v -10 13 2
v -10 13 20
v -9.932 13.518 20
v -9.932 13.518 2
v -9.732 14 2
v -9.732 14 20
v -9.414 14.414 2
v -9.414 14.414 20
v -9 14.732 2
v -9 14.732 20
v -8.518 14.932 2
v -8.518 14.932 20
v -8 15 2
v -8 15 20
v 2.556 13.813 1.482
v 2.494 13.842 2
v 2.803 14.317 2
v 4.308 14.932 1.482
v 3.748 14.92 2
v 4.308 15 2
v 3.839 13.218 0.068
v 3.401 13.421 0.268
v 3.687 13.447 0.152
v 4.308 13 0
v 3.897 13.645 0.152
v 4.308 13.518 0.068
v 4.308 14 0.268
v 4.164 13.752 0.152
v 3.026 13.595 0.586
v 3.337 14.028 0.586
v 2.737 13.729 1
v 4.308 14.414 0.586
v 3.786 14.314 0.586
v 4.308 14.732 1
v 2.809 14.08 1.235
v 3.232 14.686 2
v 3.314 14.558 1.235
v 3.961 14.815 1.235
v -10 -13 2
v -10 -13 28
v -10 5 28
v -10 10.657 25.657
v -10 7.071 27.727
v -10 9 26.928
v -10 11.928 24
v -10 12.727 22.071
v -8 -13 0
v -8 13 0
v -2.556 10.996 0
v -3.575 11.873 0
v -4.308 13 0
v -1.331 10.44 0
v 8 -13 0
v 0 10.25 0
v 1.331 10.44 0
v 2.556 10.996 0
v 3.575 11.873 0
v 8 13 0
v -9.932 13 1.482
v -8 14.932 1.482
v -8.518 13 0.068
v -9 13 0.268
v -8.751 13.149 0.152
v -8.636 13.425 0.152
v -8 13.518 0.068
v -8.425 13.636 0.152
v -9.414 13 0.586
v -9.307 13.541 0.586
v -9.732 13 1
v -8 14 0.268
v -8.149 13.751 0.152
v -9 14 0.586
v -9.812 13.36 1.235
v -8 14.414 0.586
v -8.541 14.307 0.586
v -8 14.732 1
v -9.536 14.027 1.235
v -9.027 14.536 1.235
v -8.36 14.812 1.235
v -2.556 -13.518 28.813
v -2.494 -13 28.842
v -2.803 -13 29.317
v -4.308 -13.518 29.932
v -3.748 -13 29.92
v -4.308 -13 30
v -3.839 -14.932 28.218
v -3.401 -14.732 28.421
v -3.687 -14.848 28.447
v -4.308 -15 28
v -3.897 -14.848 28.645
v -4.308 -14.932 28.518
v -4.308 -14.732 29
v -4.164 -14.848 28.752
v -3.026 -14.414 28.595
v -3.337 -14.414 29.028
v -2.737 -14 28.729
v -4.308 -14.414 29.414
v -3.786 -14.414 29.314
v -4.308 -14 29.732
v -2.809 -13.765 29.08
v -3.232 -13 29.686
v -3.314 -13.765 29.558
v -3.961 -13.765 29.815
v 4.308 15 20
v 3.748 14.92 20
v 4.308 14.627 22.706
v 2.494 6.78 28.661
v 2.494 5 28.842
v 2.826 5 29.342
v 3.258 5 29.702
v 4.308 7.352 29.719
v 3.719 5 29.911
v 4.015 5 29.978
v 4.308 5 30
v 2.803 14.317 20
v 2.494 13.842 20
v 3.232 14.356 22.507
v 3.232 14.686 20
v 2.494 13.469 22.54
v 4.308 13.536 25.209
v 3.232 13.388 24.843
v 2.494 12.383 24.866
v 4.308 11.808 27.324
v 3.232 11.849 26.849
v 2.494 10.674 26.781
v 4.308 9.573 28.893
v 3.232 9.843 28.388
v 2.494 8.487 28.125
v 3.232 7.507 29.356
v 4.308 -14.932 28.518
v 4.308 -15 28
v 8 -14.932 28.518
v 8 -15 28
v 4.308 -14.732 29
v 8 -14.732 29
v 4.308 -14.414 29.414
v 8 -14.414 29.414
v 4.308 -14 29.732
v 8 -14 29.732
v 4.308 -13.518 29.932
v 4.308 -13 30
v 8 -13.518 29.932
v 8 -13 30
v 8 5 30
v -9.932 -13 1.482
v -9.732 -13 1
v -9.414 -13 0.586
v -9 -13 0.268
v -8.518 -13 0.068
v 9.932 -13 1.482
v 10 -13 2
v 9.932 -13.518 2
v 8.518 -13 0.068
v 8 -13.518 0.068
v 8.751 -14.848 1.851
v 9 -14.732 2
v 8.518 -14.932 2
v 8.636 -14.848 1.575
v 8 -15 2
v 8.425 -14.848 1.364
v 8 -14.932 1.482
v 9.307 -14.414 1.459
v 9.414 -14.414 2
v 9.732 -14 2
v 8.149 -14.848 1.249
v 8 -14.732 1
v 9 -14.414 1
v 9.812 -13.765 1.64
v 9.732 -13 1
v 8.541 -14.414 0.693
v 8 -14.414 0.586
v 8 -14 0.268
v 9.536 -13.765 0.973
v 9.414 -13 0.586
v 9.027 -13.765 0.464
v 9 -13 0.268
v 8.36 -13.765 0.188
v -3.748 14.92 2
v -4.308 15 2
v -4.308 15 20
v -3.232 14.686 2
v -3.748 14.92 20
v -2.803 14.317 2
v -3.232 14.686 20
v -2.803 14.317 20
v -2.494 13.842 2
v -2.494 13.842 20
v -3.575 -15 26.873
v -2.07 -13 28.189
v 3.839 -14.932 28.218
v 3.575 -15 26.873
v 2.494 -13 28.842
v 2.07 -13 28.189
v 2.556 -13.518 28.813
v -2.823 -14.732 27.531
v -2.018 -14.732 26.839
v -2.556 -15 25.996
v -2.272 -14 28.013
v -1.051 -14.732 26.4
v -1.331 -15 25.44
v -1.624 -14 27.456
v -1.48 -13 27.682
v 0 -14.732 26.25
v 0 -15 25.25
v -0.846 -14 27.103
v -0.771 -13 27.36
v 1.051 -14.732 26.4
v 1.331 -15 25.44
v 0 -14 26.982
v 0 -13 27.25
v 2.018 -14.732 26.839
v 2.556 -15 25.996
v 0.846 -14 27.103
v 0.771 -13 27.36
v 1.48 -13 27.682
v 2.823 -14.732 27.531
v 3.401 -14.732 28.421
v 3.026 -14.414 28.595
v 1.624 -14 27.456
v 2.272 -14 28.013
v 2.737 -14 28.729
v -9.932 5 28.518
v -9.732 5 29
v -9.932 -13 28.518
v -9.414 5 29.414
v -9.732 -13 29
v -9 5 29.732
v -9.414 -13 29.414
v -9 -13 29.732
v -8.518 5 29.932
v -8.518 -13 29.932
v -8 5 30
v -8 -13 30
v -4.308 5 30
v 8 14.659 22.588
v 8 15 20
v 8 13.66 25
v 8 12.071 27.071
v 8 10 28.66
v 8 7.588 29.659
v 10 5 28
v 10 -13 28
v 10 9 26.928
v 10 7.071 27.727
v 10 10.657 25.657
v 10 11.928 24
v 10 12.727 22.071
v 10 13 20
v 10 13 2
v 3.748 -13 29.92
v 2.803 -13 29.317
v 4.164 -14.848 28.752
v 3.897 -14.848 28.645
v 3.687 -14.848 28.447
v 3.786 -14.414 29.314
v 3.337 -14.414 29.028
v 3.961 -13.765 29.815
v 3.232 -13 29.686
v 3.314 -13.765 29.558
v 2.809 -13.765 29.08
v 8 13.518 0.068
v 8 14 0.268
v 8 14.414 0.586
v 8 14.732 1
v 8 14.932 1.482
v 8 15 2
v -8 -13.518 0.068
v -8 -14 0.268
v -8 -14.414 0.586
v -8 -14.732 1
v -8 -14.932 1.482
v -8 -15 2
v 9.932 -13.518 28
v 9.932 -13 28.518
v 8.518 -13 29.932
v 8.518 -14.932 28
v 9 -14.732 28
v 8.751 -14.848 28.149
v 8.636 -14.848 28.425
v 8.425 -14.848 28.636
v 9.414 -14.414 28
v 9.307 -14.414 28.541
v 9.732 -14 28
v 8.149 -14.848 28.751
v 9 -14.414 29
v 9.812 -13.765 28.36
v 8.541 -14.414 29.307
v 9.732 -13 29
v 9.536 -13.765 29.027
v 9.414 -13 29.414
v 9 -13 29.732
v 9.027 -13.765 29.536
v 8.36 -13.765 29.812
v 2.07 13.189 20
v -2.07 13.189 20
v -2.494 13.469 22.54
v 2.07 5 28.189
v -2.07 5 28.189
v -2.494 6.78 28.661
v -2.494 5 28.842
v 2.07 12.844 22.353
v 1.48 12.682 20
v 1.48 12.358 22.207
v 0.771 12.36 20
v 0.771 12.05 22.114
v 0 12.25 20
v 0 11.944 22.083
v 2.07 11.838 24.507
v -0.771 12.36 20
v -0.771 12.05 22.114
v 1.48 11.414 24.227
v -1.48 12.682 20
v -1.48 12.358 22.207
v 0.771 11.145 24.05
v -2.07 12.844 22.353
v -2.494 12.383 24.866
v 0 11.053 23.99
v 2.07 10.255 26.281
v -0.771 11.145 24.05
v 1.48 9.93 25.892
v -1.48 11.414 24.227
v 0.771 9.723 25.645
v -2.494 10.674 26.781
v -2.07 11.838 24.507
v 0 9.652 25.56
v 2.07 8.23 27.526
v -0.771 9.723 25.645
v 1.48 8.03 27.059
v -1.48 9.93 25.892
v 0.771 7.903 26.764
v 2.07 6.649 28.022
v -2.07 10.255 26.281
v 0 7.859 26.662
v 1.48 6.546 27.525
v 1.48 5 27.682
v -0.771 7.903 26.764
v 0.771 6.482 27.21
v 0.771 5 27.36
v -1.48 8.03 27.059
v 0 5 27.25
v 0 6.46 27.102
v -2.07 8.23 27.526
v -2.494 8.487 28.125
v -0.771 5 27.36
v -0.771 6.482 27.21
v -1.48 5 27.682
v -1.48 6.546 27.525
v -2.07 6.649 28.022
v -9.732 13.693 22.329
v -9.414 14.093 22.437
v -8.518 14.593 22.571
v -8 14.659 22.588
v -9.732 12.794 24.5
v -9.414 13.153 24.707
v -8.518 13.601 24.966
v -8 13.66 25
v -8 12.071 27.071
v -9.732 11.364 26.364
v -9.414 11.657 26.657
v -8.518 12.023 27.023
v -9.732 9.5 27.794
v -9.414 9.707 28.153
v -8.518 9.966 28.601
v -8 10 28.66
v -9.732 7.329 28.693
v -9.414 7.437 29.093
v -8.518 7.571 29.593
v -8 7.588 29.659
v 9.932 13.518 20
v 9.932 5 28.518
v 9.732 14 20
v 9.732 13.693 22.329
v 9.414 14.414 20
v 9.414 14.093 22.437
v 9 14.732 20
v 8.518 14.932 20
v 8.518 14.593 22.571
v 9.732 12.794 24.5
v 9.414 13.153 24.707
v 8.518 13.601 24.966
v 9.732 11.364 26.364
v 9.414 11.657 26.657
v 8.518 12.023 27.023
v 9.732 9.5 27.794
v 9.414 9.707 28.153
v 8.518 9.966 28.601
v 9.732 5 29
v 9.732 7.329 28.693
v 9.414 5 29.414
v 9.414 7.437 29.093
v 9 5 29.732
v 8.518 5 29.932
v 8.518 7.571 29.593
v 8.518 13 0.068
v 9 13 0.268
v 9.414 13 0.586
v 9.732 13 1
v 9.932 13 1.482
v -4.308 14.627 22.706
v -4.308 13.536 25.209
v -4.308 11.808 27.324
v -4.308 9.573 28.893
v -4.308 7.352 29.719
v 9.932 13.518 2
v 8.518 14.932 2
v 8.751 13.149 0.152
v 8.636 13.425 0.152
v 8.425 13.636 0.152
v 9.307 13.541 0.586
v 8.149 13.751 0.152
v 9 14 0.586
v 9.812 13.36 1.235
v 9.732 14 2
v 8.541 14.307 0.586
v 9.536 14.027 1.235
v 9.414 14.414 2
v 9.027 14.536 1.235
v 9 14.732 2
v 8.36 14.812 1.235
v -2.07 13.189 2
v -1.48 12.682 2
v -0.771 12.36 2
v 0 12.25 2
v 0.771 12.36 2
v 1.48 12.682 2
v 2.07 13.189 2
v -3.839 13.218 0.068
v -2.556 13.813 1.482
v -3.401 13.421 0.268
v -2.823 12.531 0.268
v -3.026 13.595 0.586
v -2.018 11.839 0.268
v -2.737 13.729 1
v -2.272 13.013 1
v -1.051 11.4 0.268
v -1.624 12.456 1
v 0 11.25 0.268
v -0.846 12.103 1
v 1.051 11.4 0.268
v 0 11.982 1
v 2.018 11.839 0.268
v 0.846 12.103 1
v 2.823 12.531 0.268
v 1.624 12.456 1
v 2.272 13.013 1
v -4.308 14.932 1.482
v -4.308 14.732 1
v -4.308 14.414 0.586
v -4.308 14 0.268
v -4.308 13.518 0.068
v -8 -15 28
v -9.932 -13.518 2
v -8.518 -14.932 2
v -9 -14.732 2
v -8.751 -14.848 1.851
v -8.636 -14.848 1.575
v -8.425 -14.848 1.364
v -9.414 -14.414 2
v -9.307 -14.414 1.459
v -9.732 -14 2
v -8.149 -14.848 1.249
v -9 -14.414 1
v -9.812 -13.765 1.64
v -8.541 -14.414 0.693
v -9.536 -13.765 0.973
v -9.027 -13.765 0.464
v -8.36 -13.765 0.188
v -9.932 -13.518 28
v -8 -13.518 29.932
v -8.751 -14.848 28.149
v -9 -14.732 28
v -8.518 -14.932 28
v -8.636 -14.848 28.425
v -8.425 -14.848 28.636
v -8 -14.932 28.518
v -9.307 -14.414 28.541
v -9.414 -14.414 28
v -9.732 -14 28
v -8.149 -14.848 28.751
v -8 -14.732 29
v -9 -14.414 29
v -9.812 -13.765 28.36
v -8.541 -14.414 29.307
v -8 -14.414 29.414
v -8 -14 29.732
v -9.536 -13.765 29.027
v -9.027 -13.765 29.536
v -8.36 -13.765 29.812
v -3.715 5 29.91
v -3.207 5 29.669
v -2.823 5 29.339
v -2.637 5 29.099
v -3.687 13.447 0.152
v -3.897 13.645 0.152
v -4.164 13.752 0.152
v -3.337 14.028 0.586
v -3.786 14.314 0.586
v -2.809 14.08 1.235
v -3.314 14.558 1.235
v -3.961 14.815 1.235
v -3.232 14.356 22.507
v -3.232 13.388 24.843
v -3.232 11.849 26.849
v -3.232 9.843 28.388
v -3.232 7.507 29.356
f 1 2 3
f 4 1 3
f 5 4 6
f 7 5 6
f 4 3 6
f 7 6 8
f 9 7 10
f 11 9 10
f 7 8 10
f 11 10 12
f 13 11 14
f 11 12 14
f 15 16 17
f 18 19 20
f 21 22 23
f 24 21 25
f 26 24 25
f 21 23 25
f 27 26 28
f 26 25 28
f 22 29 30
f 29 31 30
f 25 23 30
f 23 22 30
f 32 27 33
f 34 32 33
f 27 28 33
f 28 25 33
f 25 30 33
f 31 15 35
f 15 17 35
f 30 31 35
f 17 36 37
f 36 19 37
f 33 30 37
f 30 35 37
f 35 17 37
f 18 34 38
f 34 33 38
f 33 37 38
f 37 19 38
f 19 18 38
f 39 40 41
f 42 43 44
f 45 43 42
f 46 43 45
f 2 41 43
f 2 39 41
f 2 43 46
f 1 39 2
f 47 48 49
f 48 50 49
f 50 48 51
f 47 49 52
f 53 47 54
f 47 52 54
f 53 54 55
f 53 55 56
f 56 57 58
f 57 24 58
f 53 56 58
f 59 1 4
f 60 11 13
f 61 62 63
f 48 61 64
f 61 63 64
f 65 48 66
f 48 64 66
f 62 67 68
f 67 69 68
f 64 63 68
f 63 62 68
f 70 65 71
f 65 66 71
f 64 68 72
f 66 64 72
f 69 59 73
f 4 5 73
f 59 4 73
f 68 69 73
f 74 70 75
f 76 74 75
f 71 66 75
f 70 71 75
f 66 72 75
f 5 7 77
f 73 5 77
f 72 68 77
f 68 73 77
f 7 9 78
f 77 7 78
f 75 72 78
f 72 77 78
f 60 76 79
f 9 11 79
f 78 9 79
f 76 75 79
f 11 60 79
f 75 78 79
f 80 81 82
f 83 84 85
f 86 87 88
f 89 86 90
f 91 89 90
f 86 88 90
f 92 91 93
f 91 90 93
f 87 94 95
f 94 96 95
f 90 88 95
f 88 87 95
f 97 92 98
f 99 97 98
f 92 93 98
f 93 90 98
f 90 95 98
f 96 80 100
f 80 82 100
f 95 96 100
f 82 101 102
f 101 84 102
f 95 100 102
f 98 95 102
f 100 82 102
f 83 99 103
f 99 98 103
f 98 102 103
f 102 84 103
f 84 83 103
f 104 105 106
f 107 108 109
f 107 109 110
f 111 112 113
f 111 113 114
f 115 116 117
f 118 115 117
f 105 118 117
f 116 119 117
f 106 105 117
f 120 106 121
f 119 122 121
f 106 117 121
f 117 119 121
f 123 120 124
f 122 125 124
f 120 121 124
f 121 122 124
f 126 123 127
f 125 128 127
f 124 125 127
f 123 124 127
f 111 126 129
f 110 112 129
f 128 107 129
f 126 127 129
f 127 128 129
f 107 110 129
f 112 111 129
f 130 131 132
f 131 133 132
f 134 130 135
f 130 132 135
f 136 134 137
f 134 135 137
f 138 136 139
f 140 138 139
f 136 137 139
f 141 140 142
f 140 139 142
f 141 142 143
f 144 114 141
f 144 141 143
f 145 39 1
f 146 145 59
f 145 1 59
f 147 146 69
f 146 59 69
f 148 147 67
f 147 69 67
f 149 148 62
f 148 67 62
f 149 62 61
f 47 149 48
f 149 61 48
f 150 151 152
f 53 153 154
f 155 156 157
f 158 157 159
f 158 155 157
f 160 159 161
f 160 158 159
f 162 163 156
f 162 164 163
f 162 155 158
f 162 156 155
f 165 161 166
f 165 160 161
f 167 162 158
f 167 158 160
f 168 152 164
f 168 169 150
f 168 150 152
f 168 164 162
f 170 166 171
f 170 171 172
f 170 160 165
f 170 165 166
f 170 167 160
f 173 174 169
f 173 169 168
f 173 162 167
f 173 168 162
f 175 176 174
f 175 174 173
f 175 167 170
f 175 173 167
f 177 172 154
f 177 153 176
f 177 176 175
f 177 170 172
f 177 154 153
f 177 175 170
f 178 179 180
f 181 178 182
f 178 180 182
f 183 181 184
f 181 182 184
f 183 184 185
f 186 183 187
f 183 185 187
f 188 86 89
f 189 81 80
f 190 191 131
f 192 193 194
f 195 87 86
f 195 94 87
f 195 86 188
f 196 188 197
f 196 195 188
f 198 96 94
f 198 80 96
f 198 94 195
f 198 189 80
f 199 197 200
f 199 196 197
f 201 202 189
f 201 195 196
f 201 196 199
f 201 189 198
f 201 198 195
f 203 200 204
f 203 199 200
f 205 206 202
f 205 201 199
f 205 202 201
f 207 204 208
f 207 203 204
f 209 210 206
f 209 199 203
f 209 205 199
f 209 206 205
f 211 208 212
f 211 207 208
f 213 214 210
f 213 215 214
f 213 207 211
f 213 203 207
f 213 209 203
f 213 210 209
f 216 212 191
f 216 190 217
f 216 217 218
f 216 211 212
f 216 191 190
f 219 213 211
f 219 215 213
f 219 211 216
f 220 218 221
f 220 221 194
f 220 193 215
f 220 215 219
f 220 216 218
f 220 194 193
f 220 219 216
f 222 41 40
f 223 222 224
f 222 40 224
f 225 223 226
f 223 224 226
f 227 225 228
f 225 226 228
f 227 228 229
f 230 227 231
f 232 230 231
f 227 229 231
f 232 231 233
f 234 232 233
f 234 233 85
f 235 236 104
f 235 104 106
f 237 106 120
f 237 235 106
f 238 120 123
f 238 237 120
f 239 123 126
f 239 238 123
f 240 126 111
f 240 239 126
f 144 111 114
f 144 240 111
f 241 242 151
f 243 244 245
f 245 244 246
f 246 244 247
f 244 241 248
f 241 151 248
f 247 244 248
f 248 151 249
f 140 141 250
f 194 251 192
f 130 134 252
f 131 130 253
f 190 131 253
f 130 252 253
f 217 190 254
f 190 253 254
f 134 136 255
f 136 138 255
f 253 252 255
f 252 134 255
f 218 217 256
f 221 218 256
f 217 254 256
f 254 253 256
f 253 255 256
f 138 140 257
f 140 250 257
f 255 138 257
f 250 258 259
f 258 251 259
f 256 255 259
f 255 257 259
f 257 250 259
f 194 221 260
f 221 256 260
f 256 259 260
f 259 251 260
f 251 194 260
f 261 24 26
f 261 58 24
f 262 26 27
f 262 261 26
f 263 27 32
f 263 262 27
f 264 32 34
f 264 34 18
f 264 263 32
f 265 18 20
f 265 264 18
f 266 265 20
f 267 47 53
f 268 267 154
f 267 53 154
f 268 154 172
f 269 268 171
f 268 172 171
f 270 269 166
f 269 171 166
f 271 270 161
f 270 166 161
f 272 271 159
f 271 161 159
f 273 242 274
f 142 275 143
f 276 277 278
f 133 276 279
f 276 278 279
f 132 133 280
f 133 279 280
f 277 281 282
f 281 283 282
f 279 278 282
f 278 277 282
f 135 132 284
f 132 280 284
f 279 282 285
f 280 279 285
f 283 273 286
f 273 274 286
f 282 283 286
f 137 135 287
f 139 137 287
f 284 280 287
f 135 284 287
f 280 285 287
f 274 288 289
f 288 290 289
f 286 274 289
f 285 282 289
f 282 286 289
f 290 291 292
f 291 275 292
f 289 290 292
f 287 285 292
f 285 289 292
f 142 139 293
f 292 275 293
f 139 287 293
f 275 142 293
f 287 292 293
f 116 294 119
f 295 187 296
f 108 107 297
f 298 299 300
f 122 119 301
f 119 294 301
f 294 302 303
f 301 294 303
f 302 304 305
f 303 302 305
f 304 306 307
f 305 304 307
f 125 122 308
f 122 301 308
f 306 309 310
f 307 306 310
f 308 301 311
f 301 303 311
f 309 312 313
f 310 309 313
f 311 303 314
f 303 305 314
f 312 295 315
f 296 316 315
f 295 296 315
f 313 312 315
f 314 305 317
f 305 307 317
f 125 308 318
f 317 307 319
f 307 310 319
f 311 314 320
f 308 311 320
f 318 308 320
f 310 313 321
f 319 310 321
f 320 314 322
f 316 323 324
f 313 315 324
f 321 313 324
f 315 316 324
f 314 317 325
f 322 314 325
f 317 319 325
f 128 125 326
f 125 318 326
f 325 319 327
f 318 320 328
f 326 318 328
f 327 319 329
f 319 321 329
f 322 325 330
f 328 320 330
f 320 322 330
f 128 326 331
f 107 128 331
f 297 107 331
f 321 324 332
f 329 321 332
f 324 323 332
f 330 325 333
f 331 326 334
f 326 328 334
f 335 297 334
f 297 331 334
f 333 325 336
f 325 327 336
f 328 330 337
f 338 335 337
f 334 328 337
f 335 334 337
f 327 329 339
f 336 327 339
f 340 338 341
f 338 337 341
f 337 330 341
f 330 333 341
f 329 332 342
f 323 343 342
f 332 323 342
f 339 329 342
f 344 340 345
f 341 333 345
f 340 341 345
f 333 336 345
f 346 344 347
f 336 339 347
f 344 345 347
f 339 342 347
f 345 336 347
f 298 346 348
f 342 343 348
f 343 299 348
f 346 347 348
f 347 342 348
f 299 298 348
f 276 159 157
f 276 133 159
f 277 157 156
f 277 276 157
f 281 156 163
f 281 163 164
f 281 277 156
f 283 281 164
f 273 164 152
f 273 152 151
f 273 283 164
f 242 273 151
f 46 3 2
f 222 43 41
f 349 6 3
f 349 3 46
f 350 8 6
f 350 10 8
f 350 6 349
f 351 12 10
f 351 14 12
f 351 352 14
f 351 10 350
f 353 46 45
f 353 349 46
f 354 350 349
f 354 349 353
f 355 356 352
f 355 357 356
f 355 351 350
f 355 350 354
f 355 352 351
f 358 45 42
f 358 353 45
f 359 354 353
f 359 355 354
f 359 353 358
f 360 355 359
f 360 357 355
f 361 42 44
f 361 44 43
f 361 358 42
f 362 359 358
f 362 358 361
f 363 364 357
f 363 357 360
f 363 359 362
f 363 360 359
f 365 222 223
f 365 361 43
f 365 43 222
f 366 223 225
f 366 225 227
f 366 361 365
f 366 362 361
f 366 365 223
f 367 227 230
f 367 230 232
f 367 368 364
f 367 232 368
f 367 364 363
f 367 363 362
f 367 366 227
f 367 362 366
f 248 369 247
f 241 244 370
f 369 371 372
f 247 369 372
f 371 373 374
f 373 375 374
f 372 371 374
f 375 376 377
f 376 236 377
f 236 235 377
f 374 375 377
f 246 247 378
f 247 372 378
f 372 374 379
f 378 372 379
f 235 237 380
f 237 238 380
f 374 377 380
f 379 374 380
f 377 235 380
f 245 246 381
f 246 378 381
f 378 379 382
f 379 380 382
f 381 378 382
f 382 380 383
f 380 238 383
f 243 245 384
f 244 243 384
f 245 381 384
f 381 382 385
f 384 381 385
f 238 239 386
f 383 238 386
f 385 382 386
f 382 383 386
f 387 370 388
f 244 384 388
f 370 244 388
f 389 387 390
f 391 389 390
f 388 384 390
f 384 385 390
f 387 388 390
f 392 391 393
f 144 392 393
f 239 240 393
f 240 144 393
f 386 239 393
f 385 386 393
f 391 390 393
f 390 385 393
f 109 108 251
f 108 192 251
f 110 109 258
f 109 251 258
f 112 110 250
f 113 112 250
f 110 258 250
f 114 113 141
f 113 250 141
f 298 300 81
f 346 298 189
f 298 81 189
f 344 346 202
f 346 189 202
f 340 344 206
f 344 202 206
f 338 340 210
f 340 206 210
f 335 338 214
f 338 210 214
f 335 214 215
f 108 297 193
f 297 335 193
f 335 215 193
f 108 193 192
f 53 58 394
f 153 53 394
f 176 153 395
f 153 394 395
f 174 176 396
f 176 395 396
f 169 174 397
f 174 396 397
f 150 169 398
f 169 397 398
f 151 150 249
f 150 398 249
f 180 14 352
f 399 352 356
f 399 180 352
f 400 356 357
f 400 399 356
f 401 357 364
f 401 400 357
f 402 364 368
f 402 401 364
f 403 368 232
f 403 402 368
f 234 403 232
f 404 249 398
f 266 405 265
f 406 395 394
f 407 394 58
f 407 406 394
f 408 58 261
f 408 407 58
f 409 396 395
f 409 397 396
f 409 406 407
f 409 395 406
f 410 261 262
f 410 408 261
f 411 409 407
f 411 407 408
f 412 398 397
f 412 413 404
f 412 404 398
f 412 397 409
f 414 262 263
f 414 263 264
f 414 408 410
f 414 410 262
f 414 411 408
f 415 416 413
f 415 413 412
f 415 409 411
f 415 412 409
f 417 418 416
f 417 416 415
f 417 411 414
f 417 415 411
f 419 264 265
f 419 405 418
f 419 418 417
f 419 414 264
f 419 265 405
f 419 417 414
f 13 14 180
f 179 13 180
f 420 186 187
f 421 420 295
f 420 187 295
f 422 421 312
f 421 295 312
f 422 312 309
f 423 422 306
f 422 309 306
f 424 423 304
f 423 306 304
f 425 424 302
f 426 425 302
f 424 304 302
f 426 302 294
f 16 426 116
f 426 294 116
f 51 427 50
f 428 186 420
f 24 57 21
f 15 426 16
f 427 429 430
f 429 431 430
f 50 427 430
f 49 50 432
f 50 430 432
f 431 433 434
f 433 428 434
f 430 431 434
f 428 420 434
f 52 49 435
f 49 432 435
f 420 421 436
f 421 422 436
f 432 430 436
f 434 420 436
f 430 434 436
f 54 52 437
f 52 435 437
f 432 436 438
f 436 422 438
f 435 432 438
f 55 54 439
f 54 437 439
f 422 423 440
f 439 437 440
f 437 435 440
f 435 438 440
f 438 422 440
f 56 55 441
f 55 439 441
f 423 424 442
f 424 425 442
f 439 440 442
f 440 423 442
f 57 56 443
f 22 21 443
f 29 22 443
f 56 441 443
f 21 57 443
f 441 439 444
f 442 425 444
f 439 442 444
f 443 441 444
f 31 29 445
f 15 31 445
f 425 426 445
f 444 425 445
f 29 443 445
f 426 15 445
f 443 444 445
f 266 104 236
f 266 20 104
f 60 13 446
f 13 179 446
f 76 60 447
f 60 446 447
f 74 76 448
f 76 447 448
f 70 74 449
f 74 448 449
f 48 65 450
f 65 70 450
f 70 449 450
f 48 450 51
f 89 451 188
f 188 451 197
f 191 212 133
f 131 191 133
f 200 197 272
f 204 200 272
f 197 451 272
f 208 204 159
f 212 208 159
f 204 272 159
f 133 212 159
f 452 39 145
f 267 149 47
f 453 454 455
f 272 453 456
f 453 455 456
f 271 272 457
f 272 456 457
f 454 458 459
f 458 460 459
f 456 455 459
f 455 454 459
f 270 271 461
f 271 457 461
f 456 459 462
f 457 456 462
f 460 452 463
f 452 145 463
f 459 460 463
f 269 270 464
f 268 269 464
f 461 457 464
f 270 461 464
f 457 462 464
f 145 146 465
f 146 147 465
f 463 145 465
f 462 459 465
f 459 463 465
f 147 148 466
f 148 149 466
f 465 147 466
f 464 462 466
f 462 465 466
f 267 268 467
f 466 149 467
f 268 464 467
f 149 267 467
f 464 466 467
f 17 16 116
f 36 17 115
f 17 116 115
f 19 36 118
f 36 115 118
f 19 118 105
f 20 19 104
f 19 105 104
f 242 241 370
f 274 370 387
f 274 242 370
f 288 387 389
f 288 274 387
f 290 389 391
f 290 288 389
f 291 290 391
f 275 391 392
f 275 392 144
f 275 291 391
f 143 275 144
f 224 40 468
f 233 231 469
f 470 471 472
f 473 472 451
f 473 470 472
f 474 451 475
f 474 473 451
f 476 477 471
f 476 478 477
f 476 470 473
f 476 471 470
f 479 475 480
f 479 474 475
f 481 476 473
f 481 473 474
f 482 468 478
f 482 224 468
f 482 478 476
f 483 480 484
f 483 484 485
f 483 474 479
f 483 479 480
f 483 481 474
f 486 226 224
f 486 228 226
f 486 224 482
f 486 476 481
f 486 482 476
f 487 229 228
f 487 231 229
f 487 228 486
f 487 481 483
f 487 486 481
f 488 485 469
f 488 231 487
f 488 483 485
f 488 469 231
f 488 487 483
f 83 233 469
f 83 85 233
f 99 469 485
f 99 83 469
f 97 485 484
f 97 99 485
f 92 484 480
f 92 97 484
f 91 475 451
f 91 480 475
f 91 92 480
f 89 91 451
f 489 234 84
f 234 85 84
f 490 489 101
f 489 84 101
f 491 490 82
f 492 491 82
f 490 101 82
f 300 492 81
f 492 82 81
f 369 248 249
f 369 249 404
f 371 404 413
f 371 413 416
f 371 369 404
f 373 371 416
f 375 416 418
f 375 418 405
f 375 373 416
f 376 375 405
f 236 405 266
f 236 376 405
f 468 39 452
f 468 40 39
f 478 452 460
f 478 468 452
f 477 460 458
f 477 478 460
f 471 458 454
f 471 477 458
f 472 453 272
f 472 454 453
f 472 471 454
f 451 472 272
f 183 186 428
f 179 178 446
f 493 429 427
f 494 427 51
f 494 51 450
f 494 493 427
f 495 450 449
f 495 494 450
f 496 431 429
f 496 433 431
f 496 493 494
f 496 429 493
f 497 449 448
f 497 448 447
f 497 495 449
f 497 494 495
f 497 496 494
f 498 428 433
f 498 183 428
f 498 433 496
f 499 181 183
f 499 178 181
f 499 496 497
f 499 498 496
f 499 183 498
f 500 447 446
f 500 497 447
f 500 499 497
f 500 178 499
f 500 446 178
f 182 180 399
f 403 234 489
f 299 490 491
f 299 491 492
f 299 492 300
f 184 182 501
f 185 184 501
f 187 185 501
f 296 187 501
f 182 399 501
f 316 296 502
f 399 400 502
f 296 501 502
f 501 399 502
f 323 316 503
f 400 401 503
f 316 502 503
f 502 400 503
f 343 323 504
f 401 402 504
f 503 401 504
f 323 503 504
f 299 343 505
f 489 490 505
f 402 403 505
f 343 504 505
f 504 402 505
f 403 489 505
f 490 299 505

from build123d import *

# Parameters (mm, degrees)
F0_R     = 9.5
F0_R_2   = 8
F1_DEPTH = 150
F3_W     = 20
F3_H     = 30
F4_DEPTH = 30
F5_R     = 10
F9_R     = 2


with BuildPart() as f1:
    # F0 (on Top) → F1 (new body)
    with BuildSketch(Plane.XY):
        Circle(F0_R)
        Circle(F0_R_2, mode=Mode.SUBTRACT)
    extrude(amount=F1_DEPTH)


with BuildPart() as f4:
    # F3 (on Top) → F4 (new body)
    with BuildSketch(Plane.XY):
        Rectangle(F3_W, F3_H)
    extrude(amount=F4_DEPTH)

    # F5
    f5_edges = [f4.edges().sort_by_distance(p)[0] for p in [
        (0, 15, 30),
    ]]
    fillet(f5_edges, radius=F5_R)

    # F8: sweep along a path in F6
    with BuildLine(Plane.YZ) as f8_path:
        Line((15, 0), (15, 20))
        ThreePointArc((15, 20), (12.0710678119, 27.0710678119), (5, 30))
        Line((5, 30), (-15.0585370138, 30))
    # F7 (on face) → F8 (sweep, cut)
    with BuildSketch(Plane(origin=(0, 0, 0), x_dir=(1, 0, 0), z_dir=(0, 0, -1))):
        with BuildLine():
            Line((-2.75, -15), (2.75, -15))
            ThreePointArc((2.75, -15), (0, -12.25), (-2.75, -15))
        make_face()
    sweep(path=f8_path.line, mode=Mode.SUBTRACT)

    # F9
    f9_edges = [f4.edges().sort_by_distance(p)[0] for p in [
        (0, 5, 27.25),
        (-2.75, -5, 30),
        (0, -15, 27.25),
        (2.75, -5, 30),
        (2.75, 12.071068, 27.071068),
        (0, 12.25, 20),
        (-2.75, 12.071068, 27.071068),
        (2.75, 15, 10),
        (0, 12.25, 0),
        (-2.75, 15, 10),
        (-10, 12.071068, 27.071068),
        (10, 12.071068, 27.071068),
        (10, 15, 10),
        (10, 0, 0),
        (10, -5, 30),
        (10, -15, 15),
        (-10, 15, 10),
        (-10, 0, 0),
        (-10, -5, 30),
        (-10, -15, 15),
        (0, -15, 0),
        (-6.375, 15, 0),
        (6.375, 15, 0),
        (6.375, -15, 30),
        (-6.375, -15, 30),
    ]]
    fillet(f9_edges, radius=F9_R)


solid = f4.part
